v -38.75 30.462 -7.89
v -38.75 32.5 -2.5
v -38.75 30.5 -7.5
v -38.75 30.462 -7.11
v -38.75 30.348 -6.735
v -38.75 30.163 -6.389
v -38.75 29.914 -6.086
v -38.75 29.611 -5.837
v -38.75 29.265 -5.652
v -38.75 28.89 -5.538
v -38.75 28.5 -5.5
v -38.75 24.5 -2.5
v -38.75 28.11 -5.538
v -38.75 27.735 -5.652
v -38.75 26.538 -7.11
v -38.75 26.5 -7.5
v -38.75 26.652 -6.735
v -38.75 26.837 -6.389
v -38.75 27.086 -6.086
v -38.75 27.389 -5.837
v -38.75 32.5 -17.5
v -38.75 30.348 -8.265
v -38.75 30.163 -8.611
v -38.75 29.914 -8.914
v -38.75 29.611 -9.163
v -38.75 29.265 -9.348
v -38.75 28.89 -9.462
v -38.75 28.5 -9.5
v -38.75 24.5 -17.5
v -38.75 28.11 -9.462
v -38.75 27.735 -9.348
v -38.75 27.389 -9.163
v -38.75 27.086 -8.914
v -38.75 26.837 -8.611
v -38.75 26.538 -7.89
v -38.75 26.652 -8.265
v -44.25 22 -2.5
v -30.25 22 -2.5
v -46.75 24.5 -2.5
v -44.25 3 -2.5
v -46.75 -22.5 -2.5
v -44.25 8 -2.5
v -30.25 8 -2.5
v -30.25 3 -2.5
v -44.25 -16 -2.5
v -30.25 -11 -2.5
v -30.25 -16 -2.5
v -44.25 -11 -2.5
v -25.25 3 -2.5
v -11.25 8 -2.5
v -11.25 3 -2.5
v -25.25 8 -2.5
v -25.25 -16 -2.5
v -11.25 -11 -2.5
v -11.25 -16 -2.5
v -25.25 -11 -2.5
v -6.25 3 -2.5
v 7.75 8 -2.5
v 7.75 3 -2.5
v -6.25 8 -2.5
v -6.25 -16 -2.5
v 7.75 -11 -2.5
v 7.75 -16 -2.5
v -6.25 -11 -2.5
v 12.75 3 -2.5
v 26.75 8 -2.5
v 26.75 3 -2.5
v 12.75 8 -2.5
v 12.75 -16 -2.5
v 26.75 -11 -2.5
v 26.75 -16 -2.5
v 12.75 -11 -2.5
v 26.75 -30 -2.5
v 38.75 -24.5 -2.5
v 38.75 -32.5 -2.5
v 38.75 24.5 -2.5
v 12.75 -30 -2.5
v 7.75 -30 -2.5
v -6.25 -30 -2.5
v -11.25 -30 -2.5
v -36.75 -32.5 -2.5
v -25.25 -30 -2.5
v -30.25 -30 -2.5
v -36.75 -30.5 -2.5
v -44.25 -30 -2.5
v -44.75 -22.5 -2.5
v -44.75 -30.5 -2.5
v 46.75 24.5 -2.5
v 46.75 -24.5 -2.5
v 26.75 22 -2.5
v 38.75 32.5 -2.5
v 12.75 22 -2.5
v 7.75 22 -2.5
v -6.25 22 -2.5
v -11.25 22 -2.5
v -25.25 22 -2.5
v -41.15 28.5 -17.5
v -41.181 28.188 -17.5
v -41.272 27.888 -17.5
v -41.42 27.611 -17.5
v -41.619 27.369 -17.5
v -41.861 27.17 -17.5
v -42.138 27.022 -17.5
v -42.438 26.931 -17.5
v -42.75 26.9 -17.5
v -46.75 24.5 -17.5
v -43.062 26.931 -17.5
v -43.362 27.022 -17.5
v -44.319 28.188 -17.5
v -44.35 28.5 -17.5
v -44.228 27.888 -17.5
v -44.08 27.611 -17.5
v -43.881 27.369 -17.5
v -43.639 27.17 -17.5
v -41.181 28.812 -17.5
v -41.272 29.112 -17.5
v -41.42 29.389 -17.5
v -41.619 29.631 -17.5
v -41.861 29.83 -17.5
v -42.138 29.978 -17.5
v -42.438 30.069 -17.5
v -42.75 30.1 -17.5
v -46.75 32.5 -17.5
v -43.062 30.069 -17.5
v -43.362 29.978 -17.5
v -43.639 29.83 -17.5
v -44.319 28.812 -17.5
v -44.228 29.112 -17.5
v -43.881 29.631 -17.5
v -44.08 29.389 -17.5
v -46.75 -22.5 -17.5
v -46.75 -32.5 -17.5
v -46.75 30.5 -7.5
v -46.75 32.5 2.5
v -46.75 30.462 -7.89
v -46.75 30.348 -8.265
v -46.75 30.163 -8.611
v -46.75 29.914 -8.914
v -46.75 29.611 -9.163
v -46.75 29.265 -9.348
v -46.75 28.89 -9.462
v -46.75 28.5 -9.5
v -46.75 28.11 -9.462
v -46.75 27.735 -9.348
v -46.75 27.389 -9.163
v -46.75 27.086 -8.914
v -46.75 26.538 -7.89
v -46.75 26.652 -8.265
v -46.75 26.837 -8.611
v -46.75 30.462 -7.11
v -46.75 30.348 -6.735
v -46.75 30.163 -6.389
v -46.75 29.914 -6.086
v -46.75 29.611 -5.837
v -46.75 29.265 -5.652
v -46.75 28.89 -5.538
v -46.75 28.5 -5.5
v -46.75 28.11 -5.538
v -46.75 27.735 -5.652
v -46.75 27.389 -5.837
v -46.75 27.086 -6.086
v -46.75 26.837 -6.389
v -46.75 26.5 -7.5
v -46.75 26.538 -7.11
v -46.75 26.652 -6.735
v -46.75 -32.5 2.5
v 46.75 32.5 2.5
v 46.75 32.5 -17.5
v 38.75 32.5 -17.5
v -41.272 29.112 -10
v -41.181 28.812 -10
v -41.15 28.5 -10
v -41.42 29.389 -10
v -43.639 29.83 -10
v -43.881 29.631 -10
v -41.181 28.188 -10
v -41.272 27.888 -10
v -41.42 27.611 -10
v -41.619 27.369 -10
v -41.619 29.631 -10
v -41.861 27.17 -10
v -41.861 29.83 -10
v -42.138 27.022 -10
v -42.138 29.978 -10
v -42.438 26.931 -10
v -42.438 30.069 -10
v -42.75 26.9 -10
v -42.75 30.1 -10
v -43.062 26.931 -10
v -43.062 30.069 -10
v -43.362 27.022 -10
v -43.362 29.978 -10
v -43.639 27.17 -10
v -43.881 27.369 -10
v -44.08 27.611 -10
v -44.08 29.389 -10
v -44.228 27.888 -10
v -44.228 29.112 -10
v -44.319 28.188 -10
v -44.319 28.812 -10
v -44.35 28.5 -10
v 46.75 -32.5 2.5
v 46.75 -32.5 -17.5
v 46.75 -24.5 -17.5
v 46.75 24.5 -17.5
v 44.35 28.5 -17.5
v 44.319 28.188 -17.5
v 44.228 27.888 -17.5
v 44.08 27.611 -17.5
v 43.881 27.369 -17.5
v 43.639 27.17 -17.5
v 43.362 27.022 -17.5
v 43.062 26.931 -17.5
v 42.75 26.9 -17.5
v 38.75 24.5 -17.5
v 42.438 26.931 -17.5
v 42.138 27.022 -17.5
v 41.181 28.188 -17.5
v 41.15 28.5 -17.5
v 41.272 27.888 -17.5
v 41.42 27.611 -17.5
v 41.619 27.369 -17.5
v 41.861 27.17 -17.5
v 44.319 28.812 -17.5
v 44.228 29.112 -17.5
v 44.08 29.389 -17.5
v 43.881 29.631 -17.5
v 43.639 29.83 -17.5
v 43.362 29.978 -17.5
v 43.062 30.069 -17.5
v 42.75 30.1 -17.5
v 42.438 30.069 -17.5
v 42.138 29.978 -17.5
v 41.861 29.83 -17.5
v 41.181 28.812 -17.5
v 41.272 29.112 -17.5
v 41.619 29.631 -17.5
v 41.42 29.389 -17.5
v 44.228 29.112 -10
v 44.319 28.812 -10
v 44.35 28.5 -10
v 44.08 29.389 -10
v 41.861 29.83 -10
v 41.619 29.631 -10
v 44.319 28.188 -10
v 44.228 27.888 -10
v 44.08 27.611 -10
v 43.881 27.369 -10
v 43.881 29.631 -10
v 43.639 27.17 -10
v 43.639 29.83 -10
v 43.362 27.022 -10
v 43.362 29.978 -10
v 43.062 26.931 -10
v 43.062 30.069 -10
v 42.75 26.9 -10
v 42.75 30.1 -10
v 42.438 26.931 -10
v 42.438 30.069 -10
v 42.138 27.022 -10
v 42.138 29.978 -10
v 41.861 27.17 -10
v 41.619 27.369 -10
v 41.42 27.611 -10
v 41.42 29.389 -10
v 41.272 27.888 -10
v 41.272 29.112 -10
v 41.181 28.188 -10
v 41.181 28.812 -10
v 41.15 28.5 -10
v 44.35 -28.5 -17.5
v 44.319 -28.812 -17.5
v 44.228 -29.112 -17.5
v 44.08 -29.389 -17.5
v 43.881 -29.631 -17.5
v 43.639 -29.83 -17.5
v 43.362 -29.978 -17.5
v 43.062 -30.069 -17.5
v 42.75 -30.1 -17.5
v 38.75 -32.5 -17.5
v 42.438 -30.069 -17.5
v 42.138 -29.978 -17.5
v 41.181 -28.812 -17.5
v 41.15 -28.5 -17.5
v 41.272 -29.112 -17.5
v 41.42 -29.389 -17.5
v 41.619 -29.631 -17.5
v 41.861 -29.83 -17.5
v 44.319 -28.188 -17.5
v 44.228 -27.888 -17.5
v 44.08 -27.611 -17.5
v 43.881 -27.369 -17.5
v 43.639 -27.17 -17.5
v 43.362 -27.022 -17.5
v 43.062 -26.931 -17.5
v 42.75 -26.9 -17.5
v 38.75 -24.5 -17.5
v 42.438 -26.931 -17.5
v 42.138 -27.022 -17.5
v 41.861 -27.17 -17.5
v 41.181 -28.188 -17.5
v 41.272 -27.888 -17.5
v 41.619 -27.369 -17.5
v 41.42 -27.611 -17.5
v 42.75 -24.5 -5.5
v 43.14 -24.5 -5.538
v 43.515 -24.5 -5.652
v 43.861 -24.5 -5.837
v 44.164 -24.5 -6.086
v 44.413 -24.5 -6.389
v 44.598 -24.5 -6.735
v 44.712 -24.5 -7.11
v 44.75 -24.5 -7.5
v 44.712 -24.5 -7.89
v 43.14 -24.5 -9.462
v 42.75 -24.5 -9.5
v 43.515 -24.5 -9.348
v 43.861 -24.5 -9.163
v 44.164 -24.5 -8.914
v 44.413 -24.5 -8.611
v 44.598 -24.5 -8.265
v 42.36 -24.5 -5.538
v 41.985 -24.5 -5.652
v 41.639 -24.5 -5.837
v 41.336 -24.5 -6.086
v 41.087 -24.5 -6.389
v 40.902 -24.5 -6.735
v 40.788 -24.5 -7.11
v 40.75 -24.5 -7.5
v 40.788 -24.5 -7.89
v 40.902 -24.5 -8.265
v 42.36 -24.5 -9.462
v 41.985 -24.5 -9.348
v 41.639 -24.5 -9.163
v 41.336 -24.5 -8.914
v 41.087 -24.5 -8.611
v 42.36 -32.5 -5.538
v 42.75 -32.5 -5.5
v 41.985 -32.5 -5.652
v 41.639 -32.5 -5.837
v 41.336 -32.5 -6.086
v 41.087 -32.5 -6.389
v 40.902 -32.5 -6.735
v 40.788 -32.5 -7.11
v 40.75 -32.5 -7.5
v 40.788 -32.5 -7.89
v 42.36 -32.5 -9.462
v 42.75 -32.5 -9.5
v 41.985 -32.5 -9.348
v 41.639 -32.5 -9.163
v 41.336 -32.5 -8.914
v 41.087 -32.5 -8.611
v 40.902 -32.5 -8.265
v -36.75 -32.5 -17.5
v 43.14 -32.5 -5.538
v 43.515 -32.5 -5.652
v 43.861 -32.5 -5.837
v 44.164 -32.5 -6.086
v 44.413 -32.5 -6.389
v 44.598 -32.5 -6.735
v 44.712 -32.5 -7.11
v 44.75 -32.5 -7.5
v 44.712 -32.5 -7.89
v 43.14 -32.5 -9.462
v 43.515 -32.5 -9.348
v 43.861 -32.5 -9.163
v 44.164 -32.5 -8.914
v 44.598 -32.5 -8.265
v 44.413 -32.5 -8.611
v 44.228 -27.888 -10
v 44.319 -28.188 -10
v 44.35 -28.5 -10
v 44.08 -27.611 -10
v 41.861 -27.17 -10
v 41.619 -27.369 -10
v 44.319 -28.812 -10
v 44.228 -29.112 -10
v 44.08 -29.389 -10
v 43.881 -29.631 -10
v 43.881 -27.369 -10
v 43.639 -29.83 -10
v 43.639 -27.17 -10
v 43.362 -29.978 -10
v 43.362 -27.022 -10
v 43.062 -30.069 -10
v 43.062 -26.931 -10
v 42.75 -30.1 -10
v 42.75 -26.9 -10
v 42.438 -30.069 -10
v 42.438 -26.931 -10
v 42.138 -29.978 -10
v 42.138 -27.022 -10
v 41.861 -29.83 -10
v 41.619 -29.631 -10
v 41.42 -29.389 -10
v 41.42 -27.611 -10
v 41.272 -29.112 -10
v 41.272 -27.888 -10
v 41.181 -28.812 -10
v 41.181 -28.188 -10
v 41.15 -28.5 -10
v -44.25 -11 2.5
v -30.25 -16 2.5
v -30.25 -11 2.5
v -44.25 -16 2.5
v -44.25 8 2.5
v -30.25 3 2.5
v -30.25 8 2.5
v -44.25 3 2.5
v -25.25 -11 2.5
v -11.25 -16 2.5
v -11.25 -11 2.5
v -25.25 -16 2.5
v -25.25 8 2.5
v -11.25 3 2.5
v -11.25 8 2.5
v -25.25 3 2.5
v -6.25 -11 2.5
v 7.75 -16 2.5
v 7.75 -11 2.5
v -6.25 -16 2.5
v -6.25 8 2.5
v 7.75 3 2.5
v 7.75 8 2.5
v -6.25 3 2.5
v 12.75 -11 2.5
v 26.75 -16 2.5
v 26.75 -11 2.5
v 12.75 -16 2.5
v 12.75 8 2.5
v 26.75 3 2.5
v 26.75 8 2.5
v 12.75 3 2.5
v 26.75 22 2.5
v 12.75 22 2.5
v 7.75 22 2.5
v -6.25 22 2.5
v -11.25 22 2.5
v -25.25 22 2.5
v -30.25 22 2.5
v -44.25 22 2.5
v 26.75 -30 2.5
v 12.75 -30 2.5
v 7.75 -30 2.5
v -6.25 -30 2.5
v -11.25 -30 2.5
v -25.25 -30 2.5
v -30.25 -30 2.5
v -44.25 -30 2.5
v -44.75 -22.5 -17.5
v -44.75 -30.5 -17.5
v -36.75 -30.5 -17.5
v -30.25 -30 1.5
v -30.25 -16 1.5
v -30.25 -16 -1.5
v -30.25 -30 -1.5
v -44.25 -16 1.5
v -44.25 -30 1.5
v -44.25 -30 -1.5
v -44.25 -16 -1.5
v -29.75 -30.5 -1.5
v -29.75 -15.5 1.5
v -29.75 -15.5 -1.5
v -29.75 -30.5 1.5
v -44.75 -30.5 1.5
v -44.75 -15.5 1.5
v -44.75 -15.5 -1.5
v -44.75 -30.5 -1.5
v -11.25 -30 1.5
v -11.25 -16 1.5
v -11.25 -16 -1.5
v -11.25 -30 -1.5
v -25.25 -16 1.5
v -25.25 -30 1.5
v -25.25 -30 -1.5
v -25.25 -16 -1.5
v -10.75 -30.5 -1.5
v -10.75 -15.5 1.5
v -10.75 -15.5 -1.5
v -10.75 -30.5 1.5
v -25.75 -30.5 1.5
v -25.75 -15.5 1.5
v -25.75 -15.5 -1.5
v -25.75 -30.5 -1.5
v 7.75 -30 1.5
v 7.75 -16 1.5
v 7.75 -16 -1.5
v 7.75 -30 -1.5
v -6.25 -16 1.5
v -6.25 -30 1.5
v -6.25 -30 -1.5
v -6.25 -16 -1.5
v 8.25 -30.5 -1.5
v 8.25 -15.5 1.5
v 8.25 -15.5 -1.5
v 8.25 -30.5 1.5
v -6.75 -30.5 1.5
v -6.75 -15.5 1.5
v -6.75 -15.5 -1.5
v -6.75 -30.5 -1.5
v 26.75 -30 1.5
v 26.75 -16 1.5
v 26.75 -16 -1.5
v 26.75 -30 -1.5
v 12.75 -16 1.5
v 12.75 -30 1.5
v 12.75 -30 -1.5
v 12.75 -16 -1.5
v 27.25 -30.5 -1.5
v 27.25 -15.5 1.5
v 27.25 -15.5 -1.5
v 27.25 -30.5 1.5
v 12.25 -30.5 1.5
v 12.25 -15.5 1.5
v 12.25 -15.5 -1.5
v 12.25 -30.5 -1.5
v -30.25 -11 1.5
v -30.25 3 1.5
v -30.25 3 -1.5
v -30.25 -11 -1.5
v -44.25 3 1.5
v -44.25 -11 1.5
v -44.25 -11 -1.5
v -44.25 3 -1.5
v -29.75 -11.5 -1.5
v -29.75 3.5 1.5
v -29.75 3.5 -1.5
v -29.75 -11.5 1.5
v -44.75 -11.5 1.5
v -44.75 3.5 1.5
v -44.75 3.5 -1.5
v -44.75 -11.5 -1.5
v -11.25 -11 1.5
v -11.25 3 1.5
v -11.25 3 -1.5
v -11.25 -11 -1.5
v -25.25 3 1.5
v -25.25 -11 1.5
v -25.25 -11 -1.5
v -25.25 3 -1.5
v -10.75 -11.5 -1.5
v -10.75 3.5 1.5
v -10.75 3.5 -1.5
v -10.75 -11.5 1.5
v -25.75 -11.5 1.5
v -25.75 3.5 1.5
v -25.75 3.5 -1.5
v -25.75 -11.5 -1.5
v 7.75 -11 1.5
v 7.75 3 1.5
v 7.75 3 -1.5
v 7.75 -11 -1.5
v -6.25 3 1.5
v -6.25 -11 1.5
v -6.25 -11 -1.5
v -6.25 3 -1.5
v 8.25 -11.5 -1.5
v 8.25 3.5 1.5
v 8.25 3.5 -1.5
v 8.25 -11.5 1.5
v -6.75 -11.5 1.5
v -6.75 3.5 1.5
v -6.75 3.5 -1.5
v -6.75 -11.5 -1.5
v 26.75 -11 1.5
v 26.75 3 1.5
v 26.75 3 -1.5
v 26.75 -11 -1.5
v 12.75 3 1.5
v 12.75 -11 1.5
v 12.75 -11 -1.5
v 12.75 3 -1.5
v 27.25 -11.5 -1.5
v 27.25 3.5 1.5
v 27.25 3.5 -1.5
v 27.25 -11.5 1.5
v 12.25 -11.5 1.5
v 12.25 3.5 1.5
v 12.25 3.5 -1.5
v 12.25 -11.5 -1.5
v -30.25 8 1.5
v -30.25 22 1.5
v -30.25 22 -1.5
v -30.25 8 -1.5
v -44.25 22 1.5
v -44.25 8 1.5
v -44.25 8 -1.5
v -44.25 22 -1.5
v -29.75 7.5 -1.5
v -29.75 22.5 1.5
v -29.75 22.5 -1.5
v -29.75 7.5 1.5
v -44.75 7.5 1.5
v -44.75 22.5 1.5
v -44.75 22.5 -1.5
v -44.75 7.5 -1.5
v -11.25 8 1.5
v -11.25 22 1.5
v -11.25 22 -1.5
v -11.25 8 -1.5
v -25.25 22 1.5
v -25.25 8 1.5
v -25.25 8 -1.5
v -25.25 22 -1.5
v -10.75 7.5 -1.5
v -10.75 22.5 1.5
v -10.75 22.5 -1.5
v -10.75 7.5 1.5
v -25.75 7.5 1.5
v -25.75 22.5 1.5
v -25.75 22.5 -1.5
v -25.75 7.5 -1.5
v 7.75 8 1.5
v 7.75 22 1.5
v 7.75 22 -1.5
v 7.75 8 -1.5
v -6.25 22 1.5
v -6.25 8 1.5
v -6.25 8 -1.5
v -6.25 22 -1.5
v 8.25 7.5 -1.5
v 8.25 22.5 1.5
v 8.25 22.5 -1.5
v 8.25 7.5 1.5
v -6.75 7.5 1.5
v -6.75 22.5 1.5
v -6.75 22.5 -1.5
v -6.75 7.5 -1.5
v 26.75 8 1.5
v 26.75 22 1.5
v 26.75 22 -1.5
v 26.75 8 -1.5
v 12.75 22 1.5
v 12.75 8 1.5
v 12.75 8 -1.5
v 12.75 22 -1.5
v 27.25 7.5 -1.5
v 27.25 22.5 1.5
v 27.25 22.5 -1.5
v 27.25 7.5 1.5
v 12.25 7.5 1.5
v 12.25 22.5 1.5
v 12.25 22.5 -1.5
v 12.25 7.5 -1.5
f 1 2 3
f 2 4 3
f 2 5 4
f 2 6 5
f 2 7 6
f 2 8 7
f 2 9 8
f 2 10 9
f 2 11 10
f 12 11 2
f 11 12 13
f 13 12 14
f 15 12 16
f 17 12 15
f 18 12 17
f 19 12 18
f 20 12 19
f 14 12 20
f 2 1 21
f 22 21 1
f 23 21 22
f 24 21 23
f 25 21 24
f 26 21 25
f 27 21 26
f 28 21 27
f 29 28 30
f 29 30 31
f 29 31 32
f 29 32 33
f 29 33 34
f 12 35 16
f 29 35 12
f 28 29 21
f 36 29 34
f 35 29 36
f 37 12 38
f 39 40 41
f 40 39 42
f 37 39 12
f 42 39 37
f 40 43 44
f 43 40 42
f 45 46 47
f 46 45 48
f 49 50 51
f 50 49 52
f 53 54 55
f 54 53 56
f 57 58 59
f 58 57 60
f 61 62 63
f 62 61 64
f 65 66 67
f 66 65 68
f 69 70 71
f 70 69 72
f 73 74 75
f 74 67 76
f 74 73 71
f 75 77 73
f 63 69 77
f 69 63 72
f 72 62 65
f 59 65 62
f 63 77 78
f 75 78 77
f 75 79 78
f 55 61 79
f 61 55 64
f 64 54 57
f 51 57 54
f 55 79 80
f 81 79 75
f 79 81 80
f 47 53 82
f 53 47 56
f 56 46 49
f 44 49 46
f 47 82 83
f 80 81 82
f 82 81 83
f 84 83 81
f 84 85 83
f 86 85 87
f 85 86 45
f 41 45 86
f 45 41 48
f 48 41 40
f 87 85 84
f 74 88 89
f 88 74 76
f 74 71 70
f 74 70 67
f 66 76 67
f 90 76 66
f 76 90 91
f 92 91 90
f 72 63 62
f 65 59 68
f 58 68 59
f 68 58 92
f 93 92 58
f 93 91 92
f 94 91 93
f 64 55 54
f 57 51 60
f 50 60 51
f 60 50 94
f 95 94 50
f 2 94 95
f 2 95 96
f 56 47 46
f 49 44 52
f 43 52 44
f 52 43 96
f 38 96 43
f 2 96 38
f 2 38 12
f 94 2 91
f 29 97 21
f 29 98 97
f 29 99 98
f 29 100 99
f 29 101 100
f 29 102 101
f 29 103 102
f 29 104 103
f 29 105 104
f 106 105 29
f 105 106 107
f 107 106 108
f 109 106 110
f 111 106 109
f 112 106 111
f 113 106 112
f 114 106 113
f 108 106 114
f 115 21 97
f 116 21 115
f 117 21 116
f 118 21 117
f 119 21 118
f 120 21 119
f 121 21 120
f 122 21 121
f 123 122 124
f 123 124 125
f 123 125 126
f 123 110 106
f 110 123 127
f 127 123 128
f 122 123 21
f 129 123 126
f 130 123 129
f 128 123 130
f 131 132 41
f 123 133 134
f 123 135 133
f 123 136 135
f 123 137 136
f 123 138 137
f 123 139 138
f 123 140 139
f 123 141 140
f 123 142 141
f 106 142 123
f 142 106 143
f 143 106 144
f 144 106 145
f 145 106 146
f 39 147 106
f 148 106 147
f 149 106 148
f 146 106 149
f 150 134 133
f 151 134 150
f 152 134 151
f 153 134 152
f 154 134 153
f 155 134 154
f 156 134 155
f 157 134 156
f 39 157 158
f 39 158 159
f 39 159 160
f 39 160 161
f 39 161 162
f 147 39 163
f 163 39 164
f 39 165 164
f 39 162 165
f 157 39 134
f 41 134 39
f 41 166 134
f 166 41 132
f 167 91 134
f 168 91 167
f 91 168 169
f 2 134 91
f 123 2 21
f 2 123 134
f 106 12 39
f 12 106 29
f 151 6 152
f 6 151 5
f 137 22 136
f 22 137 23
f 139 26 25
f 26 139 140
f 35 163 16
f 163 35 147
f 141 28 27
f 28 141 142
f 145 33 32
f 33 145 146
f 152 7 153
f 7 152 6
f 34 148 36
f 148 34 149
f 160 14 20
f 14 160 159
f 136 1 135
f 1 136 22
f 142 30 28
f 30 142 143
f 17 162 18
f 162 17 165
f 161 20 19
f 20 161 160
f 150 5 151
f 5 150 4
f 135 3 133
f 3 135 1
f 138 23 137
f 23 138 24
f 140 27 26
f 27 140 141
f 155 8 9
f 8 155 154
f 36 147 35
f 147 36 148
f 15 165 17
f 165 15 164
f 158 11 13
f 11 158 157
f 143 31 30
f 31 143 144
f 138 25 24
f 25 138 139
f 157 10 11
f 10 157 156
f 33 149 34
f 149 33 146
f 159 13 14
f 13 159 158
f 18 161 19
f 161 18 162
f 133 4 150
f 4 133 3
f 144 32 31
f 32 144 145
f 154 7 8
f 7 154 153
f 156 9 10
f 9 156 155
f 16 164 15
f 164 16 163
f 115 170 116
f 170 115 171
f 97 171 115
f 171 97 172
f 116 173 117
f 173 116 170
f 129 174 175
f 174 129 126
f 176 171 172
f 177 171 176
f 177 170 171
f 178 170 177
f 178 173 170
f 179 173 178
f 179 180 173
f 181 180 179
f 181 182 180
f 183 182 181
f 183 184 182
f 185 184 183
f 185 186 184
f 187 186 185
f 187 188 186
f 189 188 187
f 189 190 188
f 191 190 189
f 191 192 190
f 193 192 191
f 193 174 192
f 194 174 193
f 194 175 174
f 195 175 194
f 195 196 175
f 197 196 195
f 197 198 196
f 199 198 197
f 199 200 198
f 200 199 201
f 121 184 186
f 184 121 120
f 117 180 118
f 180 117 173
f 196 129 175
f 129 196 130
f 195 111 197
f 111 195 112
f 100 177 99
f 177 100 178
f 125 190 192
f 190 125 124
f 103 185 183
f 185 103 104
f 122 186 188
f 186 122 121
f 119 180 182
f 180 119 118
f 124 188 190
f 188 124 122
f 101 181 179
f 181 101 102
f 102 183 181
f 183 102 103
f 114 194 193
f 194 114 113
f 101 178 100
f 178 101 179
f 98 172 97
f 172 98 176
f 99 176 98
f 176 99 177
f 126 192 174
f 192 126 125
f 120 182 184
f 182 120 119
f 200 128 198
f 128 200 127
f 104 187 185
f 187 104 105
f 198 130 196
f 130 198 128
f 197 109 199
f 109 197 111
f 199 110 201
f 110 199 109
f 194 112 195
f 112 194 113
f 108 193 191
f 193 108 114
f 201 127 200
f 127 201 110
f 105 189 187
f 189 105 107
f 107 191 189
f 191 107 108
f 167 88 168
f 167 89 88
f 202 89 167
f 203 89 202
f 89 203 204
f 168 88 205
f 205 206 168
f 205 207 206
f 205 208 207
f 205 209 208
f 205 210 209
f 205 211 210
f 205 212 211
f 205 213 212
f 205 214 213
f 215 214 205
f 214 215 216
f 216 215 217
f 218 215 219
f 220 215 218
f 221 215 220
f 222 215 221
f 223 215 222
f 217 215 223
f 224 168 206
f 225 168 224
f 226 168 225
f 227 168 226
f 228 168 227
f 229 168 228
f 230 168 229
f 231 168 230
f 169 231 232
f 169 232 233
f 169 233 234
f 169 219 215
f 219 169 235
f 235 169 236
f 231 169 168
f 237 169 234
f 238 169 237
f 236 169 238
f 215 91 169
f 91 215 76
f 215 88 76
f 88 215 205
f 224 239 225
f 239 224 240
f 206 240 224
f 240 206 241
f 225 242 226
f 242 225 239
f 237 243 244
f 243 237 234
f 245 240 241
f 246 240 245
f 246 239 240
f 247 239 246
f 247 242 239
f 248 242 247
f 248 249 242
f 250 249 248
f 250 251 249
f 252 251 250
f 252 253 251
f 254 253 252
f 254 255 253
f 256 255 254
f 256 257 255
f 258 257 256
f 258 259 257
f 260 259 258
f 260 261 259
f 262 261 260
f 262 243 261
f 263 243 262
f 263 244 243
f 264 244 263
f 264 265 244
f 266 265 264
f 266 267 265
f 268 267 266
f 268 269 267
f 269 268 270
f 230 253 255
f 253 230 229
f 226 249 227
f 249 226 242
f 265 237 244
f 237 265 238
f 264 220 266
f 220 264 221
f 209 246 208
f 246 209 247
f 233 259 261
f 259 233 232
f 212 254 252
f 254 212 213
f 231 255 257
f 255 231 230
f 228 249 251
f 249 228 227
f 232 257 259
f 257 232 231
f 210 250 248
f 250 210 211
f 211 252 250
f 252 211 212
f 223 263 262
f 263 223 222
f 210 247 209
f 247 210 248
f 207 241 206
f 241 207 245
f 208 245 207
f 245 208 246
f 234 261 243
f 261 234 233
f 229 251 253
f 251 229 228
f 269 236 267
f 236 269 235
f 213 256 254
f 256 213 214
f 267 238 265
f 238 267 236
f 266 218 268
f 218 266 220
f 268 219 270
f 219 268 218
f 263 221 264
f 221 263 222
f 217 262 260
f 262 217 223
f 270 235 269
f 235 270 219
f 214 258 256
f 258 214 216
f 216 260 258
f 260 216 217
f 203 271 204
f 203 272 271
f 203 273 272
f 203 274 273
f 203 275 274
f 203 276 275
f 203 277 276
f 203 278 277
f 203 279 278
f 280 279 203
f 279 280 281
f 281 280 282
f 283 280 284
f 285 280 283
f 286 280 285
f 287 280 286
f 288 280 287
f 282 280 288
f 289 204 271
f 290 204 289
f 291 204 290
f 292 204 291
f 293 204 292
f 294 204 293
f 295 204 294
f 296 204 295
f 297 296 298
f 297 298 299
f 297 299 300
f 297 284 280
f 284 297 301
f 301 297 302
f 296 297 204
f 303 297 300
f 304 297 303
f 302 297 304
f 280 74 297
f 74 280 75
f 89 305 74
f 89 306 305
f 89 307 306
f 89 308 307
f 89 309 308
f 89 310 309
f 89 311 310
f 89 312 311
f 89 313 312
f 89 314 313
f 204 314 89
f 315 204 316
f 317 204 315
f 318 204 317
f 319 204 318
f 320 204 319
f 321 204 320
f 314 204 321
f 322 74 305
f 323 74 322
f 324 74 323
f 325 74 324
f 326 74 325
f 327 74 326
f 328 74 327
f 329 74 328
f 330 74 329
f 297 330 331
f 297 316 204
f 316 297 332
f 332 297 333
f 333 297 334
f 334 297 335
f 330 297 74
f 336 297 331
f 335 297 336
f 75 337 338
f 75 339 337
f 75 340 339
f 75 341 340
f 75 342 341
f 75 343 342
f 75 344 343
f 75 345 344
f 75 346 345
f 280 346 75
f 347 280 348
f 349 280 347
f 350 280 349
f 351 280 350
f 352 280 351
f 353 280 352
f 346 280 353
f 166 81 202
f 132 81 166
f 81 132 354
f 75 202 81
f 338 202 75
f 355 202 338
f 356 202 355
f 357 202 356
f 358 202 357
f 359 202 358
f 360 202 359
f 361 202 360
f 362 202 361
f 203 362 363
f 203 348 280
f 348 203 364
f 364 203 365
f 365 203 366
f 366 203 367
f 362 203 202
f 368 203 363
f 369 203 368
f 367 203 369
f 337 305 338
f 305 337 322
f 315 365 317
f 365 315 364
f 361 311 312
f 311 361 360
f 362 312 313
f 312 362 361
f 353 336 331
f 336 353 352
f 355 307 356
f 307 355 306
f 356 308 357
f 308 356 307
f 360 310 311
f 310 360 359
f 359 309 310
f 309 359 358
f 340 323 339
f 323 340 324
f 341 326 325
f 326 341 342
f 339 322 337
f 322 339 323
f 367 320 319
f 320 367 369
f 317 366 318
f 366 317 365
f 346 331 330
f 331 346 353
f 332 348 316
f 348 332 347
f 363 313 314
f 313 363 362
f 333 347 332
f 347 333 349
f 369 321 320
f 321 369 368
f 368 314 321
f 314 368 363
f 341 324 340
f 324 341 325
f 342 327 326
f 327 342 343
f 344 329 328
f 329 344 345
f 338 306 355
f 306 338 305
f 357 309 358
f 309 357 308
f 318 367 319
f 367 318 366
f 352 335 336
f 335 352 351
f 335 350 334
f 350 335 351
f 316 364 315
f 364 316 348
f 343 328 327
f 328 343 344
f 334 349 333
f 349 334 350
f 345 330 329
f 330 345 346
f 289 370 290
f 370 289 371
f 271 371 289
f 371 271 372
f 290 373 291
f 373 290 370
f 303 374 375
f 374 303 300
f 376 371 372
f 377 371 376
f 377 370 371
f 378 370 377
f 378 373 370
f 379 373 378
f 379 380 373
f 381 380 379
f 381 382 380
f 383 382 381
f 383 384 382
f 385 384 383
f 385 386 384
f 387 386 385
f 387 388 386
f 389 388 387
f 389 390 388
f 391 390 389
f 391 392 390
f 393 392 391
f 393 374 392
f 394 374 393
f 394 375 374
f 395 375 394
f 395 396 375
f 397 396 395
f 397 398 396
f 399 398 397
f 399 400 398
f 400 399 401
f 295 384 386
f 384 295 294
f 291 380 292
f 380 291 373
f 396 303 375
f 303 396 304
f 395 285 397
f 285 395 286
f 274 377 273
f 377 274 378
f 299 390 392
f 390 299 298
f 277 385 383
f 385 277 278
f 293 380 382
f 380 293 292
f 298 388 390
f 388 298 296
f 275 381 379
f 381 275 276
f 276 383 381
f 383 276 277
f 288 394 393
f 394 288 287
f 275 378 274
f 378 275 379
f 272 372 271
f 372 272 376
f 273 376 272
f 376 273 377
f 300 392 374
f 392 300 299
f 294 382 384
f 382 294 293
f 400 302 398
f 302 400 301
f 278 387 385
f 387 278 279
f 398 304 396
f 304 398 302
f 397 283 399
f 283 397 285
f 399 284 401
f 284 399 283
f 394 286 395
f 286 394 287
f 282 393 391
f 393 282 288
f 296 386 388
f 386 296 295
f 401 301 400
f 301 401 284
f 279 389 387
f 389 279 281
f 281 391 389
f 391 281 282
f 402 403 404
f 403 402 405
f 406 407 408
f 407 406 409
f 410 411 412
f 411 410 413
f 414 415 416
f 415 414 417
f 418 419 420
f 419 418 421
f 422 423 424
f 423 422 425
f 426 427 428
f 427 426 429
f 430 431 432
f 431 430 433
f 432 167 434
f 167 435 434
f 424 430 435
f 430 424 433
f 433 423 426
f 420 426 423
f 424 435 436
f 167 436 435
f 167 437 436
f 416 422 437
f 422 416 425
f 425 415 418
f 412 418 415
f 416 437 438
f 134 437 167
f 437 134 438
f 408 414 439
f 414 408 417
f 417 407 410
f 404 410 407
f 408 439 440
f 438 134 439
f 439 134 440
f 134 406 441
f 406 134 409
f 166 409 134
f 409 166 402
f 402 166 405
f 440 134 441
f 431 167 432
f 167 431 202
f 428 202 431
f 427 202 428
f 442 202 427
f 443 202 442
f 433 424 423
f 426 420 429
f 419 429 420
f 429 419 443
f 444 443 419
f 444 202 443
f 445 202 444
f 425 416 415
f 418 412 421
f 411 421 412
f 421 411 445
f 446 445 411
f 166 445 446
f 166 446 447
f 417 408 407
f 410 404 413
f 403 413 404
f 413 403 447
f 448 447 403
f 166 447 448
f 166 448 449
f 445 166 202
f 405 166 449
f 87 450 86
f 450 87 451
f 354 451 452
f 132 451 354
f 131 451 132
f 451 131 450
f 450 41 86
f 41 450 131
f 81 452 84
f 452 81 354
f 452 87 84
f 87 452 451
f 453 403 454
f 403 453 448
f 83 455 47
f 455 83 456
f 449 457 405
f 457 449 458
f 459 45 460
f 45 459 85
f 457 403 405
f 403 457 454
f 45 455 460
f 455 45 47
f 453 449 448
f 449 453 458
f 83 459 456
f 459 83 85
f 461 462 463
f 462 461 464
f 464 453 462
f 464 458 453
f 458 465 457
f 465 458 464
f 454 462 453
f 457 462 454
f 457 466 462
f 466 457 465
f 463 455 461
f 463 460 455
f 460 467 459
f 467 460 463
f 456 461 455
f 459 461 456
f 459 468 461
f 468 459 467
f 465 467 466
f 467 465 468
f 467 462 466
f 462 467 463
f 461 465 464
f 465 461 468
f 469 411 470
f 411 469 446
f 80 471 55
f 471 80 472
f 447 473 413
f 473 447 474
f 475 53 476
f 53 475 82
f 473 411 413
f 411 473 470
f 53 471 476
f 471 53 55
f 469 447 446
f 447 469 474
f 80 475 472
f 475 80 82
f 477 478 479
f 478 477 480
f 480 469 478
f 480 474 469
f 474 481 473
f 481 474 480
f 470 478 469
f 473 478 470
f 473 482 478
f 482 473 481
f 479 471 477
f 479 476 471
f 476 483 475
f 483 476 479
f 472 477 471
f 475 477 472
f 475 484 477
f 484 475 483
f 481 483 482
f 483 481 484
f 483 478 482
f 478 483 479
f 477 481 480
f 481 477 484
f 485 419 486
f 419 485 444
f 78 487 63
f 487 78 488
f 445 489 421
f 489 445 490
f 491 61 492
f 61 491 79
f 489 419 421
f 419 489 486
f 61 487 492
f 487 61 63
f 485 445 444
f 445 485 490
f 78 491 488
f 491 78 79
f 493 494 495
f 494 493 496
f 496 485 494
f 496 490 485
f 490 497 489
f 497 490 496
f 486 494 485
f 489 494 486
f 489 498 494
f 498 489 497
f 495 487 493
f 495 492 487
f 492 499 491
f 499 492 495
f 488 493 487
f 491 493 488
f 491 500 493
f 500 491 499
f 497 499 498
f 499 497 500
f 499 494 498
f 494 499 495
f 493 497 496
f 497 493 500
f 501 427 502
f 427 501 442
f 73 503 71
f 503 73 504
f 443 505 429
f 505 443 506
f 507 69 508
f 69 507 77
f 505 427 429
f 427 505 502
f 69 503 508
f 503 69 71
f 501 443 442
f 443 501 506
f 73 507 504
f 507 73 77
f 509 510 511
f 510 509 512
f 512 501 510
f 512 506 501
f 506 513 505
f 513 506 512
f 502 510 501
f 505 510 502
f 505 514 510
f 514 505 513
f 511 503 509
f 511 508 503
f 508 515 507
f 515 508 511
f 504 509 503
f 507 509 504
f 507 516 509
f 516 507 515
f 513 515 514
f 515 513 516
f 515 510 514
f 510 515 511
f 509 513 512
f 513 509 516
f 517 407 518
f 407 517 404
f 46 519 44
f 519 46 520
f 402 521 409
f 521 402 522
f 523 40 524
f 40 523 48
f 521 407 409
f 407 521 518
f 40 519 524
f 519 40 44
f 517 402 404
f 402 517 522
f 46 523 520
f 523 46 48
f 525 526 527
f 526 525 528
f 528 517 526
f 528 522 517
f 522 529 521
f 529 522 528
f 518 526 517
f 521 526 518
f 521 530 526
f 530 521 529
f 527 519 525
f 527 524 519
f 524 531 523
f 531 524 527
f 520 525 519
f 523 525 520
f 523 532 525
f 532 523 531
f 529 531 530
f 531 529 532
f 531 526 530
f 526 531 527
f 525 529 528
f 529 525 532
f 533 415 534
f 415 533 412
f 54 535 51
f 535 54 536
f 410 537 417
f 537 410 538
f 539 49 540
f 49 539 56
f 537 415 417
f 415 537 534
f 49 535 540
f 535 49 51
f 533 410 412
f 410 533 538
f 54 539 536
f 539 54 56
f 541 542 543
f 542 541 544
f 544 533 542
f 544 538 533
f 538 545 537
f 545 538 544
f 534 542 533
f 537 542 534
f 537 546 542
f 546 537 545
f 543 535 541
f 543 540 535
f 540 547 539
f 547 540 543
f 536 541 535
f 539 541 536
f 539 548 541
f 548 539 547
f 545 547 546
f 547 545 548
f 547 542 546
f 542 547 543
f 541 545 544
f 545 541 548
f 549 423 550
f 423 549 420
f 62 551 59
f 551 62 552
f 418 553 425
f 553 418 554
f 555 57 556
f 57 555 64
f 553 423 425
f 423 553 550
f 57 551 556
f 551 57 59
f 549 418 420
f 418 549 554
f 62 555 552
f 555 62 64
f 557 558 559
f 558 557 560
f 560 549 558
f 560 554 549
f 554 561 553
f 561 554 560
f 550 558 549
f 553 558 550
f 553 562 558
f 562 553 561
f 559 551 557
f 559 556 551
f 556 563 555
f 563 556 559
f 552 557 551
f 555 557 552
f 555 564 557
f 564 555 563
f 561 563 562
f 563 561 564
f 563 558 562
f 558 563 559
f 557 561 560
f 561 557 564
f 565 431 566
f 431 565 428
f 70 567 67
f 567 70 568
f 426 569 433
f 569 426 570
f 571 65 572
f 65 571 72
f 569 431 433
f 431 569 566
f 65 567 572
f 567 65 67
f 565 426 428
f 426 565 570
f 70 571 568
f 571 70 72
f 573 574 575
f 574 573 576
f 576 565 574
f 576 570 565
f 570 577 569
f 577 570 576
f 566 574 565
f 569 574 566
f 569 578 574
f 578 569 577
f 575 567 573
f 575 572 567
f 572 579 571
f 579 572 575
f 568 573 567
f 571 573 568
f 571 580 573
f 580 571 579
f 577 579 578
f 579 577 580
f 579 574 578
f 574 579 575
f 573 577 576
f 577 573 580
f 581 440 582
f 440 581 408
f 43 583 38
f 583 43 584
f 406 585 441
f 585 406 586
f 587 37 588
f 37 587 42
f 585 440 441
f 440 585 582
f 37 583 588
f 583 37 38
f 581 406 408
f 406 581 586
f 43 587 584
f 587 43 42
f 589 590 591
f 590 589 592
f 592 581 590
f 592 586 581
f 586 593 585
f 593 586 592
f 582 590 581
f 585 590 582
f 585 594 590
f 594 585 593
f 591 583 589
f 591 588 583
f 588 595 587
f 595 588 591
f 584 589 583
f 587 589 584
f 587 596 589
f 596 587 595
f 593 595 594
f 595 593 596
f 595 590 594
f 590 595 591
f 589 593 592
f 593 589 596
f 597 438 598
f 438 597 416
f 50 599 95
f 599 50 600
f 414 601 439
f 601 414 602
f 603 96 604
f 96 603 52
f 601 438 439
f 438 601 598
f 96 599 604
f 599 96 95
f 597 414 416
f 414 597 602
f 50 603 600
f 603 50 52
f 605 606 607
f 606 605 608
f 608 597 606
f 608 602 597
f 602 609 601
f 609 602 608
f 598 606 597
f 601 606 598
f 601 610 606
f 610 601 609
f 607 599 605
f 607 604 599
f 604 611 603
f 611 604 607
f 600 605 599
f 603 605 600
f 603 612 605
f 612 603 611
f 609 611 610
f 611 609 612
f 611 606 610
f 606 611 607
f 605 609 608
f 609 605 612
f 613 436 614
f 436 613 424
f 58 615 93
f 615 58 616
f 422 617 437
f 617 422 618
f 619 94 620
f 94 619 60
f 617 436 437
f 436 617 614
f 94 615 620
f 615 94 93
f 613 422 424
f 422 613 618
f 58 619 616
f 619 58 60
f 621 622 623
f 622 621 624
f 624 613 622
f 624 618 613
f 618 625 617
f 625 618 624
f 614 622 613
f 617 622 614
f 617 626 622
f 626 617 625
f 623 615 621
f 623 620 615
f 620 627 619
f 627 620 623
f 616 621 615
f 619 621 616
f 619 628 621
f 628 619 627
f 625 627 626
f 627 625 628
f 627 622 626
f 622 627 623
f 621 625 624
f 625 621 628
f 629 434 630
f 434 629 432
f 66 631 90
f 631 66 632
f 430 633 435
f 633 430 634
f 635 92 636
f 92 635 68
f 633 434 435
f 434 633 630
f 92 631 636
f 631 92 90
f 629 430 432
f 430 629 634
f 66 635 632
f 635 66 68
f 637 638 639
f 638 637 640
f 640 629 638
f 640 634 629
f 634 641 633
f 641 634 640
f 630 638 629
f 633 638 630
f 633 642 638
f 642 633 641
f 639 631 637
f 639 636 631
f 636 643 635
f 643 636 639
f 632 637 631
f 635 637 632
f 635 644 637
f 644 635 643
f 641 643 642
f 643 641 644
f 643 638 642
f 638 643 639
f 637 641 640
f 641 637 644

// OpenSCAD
// file: common.scad
key_size = 14;
stabilizer_size = 3.5;

b_post = 8;
m_post_s = 2;
m_post_l = 10;
post_z = 15;

plat_z = 5;

module keyhole(x, y) {
  translate([x, y, 0]) {
    cube([key_size, key_size, plat_z + 1], center = true);
    cube([key_size + 1, key_size + 1, plat_z - 2], center = true);
  }
}

module double_wide(x, y) {
  keyhole(x, y);
  for (offset=[-12, 12]) {
     translate([x + offset, y - 1, 0]) {
       cube([stabilizer_size, key_size, plat_z + 1], center = true);
       translate([0, key_size/2, 0])
         cube([stabilizer_size, 1, plat_z - 2], center = true);
       translate([0, -key_size/2, 0])
         cube([stabilizer_size, 2, plat_z - 2], center = true);
     }
  }
}

module e_post(x, y, z) {
  translate([x, y, -(plat_z + post_z)/2]) {
    difference() {
      cube([b_post, b_post, post_z], center = true);
      translate([0, 0, -post_z/2]) cylinder(h=post_z, r=1.6, center=true, $fn=32);
    }
  }
}

module e_post_i(x, y, r) {
  translate([x, y, -(plat_z + post_z)/2]) {
    difference() {
      cube([b_post, b_post, post_z], center = true);
      translate([0, 0, post_z/6]) rotate(r) cylinder(h=b_post+1, r=2, center=true, $fn=32);
      translate([0, 0, -post_z/2]) cylinder(h=post_z, r=1.6, center=true, $fn=32);
    }
  }
}

module e_post_x(x, y) {
  e_post_i(x, y, [0, 90, 0]);
}


module e_post_y(x, y) {
  e_post_i(x, y, [90, 0, 0]);
}

module i_post_x(x, y) {
  translate([x, y, -(plat_z + post_z)/2]) cube([m_post_l, m_post_s, post_z], center = true);
}

module i_post_y(x, y) {
  translate([x, y, -(plat_z + post_z)/2]) cube([m_post_s, m_post_l, post_z], center = true);
}
// file: parameters.scad
key_size = 14;
key_sep = 5;
m_key_sep = 13.5;
l_key_sep = 33;

border = 8;
b_post = 8;
m_post_s = 2;
m_post_l = 10;
post_z = 15;

key_cell = key_size + key_sep;
m_key_cell_x = key_size + m_key_sep;
l_key_cell_x = 2*key_cell;

plat_z = 5;
// main file
// Alien bat section 4: top right section

include <parameters.scad>

plat_x = 4 * key_cell + key_cell/2 + border;
plat_y = 3 * key_cell + border;

use <common.scad>

difference() {
  union() {
    cube([plat_x, plat_y, 5], center = true);
    e_post_x(-(plat_x-b_post)/2, (plat_y-b_post)/2);
    e_post((plat_x-b_post)/2, (plat_y-b_post)/2);
    e_post_y((plat_x-b_post)/2, -(plat_y-b_post)/2);

    i_post_y(-(plat_x-m_post_s)/2, -(plat_y-m_post_l)/2);
    i_post_x(-(plat_x-m_post_l)/2, -(plat_y-m_post_s)/2);
  }
  for (row = [0:2]) {
    for (col = [0:3]) {
      keyhole(-plat_x/2 + key_cell/2 + col * key_cell, -plat_y/2 + row*key_cell + key_cell/2);
    }
  }
}
